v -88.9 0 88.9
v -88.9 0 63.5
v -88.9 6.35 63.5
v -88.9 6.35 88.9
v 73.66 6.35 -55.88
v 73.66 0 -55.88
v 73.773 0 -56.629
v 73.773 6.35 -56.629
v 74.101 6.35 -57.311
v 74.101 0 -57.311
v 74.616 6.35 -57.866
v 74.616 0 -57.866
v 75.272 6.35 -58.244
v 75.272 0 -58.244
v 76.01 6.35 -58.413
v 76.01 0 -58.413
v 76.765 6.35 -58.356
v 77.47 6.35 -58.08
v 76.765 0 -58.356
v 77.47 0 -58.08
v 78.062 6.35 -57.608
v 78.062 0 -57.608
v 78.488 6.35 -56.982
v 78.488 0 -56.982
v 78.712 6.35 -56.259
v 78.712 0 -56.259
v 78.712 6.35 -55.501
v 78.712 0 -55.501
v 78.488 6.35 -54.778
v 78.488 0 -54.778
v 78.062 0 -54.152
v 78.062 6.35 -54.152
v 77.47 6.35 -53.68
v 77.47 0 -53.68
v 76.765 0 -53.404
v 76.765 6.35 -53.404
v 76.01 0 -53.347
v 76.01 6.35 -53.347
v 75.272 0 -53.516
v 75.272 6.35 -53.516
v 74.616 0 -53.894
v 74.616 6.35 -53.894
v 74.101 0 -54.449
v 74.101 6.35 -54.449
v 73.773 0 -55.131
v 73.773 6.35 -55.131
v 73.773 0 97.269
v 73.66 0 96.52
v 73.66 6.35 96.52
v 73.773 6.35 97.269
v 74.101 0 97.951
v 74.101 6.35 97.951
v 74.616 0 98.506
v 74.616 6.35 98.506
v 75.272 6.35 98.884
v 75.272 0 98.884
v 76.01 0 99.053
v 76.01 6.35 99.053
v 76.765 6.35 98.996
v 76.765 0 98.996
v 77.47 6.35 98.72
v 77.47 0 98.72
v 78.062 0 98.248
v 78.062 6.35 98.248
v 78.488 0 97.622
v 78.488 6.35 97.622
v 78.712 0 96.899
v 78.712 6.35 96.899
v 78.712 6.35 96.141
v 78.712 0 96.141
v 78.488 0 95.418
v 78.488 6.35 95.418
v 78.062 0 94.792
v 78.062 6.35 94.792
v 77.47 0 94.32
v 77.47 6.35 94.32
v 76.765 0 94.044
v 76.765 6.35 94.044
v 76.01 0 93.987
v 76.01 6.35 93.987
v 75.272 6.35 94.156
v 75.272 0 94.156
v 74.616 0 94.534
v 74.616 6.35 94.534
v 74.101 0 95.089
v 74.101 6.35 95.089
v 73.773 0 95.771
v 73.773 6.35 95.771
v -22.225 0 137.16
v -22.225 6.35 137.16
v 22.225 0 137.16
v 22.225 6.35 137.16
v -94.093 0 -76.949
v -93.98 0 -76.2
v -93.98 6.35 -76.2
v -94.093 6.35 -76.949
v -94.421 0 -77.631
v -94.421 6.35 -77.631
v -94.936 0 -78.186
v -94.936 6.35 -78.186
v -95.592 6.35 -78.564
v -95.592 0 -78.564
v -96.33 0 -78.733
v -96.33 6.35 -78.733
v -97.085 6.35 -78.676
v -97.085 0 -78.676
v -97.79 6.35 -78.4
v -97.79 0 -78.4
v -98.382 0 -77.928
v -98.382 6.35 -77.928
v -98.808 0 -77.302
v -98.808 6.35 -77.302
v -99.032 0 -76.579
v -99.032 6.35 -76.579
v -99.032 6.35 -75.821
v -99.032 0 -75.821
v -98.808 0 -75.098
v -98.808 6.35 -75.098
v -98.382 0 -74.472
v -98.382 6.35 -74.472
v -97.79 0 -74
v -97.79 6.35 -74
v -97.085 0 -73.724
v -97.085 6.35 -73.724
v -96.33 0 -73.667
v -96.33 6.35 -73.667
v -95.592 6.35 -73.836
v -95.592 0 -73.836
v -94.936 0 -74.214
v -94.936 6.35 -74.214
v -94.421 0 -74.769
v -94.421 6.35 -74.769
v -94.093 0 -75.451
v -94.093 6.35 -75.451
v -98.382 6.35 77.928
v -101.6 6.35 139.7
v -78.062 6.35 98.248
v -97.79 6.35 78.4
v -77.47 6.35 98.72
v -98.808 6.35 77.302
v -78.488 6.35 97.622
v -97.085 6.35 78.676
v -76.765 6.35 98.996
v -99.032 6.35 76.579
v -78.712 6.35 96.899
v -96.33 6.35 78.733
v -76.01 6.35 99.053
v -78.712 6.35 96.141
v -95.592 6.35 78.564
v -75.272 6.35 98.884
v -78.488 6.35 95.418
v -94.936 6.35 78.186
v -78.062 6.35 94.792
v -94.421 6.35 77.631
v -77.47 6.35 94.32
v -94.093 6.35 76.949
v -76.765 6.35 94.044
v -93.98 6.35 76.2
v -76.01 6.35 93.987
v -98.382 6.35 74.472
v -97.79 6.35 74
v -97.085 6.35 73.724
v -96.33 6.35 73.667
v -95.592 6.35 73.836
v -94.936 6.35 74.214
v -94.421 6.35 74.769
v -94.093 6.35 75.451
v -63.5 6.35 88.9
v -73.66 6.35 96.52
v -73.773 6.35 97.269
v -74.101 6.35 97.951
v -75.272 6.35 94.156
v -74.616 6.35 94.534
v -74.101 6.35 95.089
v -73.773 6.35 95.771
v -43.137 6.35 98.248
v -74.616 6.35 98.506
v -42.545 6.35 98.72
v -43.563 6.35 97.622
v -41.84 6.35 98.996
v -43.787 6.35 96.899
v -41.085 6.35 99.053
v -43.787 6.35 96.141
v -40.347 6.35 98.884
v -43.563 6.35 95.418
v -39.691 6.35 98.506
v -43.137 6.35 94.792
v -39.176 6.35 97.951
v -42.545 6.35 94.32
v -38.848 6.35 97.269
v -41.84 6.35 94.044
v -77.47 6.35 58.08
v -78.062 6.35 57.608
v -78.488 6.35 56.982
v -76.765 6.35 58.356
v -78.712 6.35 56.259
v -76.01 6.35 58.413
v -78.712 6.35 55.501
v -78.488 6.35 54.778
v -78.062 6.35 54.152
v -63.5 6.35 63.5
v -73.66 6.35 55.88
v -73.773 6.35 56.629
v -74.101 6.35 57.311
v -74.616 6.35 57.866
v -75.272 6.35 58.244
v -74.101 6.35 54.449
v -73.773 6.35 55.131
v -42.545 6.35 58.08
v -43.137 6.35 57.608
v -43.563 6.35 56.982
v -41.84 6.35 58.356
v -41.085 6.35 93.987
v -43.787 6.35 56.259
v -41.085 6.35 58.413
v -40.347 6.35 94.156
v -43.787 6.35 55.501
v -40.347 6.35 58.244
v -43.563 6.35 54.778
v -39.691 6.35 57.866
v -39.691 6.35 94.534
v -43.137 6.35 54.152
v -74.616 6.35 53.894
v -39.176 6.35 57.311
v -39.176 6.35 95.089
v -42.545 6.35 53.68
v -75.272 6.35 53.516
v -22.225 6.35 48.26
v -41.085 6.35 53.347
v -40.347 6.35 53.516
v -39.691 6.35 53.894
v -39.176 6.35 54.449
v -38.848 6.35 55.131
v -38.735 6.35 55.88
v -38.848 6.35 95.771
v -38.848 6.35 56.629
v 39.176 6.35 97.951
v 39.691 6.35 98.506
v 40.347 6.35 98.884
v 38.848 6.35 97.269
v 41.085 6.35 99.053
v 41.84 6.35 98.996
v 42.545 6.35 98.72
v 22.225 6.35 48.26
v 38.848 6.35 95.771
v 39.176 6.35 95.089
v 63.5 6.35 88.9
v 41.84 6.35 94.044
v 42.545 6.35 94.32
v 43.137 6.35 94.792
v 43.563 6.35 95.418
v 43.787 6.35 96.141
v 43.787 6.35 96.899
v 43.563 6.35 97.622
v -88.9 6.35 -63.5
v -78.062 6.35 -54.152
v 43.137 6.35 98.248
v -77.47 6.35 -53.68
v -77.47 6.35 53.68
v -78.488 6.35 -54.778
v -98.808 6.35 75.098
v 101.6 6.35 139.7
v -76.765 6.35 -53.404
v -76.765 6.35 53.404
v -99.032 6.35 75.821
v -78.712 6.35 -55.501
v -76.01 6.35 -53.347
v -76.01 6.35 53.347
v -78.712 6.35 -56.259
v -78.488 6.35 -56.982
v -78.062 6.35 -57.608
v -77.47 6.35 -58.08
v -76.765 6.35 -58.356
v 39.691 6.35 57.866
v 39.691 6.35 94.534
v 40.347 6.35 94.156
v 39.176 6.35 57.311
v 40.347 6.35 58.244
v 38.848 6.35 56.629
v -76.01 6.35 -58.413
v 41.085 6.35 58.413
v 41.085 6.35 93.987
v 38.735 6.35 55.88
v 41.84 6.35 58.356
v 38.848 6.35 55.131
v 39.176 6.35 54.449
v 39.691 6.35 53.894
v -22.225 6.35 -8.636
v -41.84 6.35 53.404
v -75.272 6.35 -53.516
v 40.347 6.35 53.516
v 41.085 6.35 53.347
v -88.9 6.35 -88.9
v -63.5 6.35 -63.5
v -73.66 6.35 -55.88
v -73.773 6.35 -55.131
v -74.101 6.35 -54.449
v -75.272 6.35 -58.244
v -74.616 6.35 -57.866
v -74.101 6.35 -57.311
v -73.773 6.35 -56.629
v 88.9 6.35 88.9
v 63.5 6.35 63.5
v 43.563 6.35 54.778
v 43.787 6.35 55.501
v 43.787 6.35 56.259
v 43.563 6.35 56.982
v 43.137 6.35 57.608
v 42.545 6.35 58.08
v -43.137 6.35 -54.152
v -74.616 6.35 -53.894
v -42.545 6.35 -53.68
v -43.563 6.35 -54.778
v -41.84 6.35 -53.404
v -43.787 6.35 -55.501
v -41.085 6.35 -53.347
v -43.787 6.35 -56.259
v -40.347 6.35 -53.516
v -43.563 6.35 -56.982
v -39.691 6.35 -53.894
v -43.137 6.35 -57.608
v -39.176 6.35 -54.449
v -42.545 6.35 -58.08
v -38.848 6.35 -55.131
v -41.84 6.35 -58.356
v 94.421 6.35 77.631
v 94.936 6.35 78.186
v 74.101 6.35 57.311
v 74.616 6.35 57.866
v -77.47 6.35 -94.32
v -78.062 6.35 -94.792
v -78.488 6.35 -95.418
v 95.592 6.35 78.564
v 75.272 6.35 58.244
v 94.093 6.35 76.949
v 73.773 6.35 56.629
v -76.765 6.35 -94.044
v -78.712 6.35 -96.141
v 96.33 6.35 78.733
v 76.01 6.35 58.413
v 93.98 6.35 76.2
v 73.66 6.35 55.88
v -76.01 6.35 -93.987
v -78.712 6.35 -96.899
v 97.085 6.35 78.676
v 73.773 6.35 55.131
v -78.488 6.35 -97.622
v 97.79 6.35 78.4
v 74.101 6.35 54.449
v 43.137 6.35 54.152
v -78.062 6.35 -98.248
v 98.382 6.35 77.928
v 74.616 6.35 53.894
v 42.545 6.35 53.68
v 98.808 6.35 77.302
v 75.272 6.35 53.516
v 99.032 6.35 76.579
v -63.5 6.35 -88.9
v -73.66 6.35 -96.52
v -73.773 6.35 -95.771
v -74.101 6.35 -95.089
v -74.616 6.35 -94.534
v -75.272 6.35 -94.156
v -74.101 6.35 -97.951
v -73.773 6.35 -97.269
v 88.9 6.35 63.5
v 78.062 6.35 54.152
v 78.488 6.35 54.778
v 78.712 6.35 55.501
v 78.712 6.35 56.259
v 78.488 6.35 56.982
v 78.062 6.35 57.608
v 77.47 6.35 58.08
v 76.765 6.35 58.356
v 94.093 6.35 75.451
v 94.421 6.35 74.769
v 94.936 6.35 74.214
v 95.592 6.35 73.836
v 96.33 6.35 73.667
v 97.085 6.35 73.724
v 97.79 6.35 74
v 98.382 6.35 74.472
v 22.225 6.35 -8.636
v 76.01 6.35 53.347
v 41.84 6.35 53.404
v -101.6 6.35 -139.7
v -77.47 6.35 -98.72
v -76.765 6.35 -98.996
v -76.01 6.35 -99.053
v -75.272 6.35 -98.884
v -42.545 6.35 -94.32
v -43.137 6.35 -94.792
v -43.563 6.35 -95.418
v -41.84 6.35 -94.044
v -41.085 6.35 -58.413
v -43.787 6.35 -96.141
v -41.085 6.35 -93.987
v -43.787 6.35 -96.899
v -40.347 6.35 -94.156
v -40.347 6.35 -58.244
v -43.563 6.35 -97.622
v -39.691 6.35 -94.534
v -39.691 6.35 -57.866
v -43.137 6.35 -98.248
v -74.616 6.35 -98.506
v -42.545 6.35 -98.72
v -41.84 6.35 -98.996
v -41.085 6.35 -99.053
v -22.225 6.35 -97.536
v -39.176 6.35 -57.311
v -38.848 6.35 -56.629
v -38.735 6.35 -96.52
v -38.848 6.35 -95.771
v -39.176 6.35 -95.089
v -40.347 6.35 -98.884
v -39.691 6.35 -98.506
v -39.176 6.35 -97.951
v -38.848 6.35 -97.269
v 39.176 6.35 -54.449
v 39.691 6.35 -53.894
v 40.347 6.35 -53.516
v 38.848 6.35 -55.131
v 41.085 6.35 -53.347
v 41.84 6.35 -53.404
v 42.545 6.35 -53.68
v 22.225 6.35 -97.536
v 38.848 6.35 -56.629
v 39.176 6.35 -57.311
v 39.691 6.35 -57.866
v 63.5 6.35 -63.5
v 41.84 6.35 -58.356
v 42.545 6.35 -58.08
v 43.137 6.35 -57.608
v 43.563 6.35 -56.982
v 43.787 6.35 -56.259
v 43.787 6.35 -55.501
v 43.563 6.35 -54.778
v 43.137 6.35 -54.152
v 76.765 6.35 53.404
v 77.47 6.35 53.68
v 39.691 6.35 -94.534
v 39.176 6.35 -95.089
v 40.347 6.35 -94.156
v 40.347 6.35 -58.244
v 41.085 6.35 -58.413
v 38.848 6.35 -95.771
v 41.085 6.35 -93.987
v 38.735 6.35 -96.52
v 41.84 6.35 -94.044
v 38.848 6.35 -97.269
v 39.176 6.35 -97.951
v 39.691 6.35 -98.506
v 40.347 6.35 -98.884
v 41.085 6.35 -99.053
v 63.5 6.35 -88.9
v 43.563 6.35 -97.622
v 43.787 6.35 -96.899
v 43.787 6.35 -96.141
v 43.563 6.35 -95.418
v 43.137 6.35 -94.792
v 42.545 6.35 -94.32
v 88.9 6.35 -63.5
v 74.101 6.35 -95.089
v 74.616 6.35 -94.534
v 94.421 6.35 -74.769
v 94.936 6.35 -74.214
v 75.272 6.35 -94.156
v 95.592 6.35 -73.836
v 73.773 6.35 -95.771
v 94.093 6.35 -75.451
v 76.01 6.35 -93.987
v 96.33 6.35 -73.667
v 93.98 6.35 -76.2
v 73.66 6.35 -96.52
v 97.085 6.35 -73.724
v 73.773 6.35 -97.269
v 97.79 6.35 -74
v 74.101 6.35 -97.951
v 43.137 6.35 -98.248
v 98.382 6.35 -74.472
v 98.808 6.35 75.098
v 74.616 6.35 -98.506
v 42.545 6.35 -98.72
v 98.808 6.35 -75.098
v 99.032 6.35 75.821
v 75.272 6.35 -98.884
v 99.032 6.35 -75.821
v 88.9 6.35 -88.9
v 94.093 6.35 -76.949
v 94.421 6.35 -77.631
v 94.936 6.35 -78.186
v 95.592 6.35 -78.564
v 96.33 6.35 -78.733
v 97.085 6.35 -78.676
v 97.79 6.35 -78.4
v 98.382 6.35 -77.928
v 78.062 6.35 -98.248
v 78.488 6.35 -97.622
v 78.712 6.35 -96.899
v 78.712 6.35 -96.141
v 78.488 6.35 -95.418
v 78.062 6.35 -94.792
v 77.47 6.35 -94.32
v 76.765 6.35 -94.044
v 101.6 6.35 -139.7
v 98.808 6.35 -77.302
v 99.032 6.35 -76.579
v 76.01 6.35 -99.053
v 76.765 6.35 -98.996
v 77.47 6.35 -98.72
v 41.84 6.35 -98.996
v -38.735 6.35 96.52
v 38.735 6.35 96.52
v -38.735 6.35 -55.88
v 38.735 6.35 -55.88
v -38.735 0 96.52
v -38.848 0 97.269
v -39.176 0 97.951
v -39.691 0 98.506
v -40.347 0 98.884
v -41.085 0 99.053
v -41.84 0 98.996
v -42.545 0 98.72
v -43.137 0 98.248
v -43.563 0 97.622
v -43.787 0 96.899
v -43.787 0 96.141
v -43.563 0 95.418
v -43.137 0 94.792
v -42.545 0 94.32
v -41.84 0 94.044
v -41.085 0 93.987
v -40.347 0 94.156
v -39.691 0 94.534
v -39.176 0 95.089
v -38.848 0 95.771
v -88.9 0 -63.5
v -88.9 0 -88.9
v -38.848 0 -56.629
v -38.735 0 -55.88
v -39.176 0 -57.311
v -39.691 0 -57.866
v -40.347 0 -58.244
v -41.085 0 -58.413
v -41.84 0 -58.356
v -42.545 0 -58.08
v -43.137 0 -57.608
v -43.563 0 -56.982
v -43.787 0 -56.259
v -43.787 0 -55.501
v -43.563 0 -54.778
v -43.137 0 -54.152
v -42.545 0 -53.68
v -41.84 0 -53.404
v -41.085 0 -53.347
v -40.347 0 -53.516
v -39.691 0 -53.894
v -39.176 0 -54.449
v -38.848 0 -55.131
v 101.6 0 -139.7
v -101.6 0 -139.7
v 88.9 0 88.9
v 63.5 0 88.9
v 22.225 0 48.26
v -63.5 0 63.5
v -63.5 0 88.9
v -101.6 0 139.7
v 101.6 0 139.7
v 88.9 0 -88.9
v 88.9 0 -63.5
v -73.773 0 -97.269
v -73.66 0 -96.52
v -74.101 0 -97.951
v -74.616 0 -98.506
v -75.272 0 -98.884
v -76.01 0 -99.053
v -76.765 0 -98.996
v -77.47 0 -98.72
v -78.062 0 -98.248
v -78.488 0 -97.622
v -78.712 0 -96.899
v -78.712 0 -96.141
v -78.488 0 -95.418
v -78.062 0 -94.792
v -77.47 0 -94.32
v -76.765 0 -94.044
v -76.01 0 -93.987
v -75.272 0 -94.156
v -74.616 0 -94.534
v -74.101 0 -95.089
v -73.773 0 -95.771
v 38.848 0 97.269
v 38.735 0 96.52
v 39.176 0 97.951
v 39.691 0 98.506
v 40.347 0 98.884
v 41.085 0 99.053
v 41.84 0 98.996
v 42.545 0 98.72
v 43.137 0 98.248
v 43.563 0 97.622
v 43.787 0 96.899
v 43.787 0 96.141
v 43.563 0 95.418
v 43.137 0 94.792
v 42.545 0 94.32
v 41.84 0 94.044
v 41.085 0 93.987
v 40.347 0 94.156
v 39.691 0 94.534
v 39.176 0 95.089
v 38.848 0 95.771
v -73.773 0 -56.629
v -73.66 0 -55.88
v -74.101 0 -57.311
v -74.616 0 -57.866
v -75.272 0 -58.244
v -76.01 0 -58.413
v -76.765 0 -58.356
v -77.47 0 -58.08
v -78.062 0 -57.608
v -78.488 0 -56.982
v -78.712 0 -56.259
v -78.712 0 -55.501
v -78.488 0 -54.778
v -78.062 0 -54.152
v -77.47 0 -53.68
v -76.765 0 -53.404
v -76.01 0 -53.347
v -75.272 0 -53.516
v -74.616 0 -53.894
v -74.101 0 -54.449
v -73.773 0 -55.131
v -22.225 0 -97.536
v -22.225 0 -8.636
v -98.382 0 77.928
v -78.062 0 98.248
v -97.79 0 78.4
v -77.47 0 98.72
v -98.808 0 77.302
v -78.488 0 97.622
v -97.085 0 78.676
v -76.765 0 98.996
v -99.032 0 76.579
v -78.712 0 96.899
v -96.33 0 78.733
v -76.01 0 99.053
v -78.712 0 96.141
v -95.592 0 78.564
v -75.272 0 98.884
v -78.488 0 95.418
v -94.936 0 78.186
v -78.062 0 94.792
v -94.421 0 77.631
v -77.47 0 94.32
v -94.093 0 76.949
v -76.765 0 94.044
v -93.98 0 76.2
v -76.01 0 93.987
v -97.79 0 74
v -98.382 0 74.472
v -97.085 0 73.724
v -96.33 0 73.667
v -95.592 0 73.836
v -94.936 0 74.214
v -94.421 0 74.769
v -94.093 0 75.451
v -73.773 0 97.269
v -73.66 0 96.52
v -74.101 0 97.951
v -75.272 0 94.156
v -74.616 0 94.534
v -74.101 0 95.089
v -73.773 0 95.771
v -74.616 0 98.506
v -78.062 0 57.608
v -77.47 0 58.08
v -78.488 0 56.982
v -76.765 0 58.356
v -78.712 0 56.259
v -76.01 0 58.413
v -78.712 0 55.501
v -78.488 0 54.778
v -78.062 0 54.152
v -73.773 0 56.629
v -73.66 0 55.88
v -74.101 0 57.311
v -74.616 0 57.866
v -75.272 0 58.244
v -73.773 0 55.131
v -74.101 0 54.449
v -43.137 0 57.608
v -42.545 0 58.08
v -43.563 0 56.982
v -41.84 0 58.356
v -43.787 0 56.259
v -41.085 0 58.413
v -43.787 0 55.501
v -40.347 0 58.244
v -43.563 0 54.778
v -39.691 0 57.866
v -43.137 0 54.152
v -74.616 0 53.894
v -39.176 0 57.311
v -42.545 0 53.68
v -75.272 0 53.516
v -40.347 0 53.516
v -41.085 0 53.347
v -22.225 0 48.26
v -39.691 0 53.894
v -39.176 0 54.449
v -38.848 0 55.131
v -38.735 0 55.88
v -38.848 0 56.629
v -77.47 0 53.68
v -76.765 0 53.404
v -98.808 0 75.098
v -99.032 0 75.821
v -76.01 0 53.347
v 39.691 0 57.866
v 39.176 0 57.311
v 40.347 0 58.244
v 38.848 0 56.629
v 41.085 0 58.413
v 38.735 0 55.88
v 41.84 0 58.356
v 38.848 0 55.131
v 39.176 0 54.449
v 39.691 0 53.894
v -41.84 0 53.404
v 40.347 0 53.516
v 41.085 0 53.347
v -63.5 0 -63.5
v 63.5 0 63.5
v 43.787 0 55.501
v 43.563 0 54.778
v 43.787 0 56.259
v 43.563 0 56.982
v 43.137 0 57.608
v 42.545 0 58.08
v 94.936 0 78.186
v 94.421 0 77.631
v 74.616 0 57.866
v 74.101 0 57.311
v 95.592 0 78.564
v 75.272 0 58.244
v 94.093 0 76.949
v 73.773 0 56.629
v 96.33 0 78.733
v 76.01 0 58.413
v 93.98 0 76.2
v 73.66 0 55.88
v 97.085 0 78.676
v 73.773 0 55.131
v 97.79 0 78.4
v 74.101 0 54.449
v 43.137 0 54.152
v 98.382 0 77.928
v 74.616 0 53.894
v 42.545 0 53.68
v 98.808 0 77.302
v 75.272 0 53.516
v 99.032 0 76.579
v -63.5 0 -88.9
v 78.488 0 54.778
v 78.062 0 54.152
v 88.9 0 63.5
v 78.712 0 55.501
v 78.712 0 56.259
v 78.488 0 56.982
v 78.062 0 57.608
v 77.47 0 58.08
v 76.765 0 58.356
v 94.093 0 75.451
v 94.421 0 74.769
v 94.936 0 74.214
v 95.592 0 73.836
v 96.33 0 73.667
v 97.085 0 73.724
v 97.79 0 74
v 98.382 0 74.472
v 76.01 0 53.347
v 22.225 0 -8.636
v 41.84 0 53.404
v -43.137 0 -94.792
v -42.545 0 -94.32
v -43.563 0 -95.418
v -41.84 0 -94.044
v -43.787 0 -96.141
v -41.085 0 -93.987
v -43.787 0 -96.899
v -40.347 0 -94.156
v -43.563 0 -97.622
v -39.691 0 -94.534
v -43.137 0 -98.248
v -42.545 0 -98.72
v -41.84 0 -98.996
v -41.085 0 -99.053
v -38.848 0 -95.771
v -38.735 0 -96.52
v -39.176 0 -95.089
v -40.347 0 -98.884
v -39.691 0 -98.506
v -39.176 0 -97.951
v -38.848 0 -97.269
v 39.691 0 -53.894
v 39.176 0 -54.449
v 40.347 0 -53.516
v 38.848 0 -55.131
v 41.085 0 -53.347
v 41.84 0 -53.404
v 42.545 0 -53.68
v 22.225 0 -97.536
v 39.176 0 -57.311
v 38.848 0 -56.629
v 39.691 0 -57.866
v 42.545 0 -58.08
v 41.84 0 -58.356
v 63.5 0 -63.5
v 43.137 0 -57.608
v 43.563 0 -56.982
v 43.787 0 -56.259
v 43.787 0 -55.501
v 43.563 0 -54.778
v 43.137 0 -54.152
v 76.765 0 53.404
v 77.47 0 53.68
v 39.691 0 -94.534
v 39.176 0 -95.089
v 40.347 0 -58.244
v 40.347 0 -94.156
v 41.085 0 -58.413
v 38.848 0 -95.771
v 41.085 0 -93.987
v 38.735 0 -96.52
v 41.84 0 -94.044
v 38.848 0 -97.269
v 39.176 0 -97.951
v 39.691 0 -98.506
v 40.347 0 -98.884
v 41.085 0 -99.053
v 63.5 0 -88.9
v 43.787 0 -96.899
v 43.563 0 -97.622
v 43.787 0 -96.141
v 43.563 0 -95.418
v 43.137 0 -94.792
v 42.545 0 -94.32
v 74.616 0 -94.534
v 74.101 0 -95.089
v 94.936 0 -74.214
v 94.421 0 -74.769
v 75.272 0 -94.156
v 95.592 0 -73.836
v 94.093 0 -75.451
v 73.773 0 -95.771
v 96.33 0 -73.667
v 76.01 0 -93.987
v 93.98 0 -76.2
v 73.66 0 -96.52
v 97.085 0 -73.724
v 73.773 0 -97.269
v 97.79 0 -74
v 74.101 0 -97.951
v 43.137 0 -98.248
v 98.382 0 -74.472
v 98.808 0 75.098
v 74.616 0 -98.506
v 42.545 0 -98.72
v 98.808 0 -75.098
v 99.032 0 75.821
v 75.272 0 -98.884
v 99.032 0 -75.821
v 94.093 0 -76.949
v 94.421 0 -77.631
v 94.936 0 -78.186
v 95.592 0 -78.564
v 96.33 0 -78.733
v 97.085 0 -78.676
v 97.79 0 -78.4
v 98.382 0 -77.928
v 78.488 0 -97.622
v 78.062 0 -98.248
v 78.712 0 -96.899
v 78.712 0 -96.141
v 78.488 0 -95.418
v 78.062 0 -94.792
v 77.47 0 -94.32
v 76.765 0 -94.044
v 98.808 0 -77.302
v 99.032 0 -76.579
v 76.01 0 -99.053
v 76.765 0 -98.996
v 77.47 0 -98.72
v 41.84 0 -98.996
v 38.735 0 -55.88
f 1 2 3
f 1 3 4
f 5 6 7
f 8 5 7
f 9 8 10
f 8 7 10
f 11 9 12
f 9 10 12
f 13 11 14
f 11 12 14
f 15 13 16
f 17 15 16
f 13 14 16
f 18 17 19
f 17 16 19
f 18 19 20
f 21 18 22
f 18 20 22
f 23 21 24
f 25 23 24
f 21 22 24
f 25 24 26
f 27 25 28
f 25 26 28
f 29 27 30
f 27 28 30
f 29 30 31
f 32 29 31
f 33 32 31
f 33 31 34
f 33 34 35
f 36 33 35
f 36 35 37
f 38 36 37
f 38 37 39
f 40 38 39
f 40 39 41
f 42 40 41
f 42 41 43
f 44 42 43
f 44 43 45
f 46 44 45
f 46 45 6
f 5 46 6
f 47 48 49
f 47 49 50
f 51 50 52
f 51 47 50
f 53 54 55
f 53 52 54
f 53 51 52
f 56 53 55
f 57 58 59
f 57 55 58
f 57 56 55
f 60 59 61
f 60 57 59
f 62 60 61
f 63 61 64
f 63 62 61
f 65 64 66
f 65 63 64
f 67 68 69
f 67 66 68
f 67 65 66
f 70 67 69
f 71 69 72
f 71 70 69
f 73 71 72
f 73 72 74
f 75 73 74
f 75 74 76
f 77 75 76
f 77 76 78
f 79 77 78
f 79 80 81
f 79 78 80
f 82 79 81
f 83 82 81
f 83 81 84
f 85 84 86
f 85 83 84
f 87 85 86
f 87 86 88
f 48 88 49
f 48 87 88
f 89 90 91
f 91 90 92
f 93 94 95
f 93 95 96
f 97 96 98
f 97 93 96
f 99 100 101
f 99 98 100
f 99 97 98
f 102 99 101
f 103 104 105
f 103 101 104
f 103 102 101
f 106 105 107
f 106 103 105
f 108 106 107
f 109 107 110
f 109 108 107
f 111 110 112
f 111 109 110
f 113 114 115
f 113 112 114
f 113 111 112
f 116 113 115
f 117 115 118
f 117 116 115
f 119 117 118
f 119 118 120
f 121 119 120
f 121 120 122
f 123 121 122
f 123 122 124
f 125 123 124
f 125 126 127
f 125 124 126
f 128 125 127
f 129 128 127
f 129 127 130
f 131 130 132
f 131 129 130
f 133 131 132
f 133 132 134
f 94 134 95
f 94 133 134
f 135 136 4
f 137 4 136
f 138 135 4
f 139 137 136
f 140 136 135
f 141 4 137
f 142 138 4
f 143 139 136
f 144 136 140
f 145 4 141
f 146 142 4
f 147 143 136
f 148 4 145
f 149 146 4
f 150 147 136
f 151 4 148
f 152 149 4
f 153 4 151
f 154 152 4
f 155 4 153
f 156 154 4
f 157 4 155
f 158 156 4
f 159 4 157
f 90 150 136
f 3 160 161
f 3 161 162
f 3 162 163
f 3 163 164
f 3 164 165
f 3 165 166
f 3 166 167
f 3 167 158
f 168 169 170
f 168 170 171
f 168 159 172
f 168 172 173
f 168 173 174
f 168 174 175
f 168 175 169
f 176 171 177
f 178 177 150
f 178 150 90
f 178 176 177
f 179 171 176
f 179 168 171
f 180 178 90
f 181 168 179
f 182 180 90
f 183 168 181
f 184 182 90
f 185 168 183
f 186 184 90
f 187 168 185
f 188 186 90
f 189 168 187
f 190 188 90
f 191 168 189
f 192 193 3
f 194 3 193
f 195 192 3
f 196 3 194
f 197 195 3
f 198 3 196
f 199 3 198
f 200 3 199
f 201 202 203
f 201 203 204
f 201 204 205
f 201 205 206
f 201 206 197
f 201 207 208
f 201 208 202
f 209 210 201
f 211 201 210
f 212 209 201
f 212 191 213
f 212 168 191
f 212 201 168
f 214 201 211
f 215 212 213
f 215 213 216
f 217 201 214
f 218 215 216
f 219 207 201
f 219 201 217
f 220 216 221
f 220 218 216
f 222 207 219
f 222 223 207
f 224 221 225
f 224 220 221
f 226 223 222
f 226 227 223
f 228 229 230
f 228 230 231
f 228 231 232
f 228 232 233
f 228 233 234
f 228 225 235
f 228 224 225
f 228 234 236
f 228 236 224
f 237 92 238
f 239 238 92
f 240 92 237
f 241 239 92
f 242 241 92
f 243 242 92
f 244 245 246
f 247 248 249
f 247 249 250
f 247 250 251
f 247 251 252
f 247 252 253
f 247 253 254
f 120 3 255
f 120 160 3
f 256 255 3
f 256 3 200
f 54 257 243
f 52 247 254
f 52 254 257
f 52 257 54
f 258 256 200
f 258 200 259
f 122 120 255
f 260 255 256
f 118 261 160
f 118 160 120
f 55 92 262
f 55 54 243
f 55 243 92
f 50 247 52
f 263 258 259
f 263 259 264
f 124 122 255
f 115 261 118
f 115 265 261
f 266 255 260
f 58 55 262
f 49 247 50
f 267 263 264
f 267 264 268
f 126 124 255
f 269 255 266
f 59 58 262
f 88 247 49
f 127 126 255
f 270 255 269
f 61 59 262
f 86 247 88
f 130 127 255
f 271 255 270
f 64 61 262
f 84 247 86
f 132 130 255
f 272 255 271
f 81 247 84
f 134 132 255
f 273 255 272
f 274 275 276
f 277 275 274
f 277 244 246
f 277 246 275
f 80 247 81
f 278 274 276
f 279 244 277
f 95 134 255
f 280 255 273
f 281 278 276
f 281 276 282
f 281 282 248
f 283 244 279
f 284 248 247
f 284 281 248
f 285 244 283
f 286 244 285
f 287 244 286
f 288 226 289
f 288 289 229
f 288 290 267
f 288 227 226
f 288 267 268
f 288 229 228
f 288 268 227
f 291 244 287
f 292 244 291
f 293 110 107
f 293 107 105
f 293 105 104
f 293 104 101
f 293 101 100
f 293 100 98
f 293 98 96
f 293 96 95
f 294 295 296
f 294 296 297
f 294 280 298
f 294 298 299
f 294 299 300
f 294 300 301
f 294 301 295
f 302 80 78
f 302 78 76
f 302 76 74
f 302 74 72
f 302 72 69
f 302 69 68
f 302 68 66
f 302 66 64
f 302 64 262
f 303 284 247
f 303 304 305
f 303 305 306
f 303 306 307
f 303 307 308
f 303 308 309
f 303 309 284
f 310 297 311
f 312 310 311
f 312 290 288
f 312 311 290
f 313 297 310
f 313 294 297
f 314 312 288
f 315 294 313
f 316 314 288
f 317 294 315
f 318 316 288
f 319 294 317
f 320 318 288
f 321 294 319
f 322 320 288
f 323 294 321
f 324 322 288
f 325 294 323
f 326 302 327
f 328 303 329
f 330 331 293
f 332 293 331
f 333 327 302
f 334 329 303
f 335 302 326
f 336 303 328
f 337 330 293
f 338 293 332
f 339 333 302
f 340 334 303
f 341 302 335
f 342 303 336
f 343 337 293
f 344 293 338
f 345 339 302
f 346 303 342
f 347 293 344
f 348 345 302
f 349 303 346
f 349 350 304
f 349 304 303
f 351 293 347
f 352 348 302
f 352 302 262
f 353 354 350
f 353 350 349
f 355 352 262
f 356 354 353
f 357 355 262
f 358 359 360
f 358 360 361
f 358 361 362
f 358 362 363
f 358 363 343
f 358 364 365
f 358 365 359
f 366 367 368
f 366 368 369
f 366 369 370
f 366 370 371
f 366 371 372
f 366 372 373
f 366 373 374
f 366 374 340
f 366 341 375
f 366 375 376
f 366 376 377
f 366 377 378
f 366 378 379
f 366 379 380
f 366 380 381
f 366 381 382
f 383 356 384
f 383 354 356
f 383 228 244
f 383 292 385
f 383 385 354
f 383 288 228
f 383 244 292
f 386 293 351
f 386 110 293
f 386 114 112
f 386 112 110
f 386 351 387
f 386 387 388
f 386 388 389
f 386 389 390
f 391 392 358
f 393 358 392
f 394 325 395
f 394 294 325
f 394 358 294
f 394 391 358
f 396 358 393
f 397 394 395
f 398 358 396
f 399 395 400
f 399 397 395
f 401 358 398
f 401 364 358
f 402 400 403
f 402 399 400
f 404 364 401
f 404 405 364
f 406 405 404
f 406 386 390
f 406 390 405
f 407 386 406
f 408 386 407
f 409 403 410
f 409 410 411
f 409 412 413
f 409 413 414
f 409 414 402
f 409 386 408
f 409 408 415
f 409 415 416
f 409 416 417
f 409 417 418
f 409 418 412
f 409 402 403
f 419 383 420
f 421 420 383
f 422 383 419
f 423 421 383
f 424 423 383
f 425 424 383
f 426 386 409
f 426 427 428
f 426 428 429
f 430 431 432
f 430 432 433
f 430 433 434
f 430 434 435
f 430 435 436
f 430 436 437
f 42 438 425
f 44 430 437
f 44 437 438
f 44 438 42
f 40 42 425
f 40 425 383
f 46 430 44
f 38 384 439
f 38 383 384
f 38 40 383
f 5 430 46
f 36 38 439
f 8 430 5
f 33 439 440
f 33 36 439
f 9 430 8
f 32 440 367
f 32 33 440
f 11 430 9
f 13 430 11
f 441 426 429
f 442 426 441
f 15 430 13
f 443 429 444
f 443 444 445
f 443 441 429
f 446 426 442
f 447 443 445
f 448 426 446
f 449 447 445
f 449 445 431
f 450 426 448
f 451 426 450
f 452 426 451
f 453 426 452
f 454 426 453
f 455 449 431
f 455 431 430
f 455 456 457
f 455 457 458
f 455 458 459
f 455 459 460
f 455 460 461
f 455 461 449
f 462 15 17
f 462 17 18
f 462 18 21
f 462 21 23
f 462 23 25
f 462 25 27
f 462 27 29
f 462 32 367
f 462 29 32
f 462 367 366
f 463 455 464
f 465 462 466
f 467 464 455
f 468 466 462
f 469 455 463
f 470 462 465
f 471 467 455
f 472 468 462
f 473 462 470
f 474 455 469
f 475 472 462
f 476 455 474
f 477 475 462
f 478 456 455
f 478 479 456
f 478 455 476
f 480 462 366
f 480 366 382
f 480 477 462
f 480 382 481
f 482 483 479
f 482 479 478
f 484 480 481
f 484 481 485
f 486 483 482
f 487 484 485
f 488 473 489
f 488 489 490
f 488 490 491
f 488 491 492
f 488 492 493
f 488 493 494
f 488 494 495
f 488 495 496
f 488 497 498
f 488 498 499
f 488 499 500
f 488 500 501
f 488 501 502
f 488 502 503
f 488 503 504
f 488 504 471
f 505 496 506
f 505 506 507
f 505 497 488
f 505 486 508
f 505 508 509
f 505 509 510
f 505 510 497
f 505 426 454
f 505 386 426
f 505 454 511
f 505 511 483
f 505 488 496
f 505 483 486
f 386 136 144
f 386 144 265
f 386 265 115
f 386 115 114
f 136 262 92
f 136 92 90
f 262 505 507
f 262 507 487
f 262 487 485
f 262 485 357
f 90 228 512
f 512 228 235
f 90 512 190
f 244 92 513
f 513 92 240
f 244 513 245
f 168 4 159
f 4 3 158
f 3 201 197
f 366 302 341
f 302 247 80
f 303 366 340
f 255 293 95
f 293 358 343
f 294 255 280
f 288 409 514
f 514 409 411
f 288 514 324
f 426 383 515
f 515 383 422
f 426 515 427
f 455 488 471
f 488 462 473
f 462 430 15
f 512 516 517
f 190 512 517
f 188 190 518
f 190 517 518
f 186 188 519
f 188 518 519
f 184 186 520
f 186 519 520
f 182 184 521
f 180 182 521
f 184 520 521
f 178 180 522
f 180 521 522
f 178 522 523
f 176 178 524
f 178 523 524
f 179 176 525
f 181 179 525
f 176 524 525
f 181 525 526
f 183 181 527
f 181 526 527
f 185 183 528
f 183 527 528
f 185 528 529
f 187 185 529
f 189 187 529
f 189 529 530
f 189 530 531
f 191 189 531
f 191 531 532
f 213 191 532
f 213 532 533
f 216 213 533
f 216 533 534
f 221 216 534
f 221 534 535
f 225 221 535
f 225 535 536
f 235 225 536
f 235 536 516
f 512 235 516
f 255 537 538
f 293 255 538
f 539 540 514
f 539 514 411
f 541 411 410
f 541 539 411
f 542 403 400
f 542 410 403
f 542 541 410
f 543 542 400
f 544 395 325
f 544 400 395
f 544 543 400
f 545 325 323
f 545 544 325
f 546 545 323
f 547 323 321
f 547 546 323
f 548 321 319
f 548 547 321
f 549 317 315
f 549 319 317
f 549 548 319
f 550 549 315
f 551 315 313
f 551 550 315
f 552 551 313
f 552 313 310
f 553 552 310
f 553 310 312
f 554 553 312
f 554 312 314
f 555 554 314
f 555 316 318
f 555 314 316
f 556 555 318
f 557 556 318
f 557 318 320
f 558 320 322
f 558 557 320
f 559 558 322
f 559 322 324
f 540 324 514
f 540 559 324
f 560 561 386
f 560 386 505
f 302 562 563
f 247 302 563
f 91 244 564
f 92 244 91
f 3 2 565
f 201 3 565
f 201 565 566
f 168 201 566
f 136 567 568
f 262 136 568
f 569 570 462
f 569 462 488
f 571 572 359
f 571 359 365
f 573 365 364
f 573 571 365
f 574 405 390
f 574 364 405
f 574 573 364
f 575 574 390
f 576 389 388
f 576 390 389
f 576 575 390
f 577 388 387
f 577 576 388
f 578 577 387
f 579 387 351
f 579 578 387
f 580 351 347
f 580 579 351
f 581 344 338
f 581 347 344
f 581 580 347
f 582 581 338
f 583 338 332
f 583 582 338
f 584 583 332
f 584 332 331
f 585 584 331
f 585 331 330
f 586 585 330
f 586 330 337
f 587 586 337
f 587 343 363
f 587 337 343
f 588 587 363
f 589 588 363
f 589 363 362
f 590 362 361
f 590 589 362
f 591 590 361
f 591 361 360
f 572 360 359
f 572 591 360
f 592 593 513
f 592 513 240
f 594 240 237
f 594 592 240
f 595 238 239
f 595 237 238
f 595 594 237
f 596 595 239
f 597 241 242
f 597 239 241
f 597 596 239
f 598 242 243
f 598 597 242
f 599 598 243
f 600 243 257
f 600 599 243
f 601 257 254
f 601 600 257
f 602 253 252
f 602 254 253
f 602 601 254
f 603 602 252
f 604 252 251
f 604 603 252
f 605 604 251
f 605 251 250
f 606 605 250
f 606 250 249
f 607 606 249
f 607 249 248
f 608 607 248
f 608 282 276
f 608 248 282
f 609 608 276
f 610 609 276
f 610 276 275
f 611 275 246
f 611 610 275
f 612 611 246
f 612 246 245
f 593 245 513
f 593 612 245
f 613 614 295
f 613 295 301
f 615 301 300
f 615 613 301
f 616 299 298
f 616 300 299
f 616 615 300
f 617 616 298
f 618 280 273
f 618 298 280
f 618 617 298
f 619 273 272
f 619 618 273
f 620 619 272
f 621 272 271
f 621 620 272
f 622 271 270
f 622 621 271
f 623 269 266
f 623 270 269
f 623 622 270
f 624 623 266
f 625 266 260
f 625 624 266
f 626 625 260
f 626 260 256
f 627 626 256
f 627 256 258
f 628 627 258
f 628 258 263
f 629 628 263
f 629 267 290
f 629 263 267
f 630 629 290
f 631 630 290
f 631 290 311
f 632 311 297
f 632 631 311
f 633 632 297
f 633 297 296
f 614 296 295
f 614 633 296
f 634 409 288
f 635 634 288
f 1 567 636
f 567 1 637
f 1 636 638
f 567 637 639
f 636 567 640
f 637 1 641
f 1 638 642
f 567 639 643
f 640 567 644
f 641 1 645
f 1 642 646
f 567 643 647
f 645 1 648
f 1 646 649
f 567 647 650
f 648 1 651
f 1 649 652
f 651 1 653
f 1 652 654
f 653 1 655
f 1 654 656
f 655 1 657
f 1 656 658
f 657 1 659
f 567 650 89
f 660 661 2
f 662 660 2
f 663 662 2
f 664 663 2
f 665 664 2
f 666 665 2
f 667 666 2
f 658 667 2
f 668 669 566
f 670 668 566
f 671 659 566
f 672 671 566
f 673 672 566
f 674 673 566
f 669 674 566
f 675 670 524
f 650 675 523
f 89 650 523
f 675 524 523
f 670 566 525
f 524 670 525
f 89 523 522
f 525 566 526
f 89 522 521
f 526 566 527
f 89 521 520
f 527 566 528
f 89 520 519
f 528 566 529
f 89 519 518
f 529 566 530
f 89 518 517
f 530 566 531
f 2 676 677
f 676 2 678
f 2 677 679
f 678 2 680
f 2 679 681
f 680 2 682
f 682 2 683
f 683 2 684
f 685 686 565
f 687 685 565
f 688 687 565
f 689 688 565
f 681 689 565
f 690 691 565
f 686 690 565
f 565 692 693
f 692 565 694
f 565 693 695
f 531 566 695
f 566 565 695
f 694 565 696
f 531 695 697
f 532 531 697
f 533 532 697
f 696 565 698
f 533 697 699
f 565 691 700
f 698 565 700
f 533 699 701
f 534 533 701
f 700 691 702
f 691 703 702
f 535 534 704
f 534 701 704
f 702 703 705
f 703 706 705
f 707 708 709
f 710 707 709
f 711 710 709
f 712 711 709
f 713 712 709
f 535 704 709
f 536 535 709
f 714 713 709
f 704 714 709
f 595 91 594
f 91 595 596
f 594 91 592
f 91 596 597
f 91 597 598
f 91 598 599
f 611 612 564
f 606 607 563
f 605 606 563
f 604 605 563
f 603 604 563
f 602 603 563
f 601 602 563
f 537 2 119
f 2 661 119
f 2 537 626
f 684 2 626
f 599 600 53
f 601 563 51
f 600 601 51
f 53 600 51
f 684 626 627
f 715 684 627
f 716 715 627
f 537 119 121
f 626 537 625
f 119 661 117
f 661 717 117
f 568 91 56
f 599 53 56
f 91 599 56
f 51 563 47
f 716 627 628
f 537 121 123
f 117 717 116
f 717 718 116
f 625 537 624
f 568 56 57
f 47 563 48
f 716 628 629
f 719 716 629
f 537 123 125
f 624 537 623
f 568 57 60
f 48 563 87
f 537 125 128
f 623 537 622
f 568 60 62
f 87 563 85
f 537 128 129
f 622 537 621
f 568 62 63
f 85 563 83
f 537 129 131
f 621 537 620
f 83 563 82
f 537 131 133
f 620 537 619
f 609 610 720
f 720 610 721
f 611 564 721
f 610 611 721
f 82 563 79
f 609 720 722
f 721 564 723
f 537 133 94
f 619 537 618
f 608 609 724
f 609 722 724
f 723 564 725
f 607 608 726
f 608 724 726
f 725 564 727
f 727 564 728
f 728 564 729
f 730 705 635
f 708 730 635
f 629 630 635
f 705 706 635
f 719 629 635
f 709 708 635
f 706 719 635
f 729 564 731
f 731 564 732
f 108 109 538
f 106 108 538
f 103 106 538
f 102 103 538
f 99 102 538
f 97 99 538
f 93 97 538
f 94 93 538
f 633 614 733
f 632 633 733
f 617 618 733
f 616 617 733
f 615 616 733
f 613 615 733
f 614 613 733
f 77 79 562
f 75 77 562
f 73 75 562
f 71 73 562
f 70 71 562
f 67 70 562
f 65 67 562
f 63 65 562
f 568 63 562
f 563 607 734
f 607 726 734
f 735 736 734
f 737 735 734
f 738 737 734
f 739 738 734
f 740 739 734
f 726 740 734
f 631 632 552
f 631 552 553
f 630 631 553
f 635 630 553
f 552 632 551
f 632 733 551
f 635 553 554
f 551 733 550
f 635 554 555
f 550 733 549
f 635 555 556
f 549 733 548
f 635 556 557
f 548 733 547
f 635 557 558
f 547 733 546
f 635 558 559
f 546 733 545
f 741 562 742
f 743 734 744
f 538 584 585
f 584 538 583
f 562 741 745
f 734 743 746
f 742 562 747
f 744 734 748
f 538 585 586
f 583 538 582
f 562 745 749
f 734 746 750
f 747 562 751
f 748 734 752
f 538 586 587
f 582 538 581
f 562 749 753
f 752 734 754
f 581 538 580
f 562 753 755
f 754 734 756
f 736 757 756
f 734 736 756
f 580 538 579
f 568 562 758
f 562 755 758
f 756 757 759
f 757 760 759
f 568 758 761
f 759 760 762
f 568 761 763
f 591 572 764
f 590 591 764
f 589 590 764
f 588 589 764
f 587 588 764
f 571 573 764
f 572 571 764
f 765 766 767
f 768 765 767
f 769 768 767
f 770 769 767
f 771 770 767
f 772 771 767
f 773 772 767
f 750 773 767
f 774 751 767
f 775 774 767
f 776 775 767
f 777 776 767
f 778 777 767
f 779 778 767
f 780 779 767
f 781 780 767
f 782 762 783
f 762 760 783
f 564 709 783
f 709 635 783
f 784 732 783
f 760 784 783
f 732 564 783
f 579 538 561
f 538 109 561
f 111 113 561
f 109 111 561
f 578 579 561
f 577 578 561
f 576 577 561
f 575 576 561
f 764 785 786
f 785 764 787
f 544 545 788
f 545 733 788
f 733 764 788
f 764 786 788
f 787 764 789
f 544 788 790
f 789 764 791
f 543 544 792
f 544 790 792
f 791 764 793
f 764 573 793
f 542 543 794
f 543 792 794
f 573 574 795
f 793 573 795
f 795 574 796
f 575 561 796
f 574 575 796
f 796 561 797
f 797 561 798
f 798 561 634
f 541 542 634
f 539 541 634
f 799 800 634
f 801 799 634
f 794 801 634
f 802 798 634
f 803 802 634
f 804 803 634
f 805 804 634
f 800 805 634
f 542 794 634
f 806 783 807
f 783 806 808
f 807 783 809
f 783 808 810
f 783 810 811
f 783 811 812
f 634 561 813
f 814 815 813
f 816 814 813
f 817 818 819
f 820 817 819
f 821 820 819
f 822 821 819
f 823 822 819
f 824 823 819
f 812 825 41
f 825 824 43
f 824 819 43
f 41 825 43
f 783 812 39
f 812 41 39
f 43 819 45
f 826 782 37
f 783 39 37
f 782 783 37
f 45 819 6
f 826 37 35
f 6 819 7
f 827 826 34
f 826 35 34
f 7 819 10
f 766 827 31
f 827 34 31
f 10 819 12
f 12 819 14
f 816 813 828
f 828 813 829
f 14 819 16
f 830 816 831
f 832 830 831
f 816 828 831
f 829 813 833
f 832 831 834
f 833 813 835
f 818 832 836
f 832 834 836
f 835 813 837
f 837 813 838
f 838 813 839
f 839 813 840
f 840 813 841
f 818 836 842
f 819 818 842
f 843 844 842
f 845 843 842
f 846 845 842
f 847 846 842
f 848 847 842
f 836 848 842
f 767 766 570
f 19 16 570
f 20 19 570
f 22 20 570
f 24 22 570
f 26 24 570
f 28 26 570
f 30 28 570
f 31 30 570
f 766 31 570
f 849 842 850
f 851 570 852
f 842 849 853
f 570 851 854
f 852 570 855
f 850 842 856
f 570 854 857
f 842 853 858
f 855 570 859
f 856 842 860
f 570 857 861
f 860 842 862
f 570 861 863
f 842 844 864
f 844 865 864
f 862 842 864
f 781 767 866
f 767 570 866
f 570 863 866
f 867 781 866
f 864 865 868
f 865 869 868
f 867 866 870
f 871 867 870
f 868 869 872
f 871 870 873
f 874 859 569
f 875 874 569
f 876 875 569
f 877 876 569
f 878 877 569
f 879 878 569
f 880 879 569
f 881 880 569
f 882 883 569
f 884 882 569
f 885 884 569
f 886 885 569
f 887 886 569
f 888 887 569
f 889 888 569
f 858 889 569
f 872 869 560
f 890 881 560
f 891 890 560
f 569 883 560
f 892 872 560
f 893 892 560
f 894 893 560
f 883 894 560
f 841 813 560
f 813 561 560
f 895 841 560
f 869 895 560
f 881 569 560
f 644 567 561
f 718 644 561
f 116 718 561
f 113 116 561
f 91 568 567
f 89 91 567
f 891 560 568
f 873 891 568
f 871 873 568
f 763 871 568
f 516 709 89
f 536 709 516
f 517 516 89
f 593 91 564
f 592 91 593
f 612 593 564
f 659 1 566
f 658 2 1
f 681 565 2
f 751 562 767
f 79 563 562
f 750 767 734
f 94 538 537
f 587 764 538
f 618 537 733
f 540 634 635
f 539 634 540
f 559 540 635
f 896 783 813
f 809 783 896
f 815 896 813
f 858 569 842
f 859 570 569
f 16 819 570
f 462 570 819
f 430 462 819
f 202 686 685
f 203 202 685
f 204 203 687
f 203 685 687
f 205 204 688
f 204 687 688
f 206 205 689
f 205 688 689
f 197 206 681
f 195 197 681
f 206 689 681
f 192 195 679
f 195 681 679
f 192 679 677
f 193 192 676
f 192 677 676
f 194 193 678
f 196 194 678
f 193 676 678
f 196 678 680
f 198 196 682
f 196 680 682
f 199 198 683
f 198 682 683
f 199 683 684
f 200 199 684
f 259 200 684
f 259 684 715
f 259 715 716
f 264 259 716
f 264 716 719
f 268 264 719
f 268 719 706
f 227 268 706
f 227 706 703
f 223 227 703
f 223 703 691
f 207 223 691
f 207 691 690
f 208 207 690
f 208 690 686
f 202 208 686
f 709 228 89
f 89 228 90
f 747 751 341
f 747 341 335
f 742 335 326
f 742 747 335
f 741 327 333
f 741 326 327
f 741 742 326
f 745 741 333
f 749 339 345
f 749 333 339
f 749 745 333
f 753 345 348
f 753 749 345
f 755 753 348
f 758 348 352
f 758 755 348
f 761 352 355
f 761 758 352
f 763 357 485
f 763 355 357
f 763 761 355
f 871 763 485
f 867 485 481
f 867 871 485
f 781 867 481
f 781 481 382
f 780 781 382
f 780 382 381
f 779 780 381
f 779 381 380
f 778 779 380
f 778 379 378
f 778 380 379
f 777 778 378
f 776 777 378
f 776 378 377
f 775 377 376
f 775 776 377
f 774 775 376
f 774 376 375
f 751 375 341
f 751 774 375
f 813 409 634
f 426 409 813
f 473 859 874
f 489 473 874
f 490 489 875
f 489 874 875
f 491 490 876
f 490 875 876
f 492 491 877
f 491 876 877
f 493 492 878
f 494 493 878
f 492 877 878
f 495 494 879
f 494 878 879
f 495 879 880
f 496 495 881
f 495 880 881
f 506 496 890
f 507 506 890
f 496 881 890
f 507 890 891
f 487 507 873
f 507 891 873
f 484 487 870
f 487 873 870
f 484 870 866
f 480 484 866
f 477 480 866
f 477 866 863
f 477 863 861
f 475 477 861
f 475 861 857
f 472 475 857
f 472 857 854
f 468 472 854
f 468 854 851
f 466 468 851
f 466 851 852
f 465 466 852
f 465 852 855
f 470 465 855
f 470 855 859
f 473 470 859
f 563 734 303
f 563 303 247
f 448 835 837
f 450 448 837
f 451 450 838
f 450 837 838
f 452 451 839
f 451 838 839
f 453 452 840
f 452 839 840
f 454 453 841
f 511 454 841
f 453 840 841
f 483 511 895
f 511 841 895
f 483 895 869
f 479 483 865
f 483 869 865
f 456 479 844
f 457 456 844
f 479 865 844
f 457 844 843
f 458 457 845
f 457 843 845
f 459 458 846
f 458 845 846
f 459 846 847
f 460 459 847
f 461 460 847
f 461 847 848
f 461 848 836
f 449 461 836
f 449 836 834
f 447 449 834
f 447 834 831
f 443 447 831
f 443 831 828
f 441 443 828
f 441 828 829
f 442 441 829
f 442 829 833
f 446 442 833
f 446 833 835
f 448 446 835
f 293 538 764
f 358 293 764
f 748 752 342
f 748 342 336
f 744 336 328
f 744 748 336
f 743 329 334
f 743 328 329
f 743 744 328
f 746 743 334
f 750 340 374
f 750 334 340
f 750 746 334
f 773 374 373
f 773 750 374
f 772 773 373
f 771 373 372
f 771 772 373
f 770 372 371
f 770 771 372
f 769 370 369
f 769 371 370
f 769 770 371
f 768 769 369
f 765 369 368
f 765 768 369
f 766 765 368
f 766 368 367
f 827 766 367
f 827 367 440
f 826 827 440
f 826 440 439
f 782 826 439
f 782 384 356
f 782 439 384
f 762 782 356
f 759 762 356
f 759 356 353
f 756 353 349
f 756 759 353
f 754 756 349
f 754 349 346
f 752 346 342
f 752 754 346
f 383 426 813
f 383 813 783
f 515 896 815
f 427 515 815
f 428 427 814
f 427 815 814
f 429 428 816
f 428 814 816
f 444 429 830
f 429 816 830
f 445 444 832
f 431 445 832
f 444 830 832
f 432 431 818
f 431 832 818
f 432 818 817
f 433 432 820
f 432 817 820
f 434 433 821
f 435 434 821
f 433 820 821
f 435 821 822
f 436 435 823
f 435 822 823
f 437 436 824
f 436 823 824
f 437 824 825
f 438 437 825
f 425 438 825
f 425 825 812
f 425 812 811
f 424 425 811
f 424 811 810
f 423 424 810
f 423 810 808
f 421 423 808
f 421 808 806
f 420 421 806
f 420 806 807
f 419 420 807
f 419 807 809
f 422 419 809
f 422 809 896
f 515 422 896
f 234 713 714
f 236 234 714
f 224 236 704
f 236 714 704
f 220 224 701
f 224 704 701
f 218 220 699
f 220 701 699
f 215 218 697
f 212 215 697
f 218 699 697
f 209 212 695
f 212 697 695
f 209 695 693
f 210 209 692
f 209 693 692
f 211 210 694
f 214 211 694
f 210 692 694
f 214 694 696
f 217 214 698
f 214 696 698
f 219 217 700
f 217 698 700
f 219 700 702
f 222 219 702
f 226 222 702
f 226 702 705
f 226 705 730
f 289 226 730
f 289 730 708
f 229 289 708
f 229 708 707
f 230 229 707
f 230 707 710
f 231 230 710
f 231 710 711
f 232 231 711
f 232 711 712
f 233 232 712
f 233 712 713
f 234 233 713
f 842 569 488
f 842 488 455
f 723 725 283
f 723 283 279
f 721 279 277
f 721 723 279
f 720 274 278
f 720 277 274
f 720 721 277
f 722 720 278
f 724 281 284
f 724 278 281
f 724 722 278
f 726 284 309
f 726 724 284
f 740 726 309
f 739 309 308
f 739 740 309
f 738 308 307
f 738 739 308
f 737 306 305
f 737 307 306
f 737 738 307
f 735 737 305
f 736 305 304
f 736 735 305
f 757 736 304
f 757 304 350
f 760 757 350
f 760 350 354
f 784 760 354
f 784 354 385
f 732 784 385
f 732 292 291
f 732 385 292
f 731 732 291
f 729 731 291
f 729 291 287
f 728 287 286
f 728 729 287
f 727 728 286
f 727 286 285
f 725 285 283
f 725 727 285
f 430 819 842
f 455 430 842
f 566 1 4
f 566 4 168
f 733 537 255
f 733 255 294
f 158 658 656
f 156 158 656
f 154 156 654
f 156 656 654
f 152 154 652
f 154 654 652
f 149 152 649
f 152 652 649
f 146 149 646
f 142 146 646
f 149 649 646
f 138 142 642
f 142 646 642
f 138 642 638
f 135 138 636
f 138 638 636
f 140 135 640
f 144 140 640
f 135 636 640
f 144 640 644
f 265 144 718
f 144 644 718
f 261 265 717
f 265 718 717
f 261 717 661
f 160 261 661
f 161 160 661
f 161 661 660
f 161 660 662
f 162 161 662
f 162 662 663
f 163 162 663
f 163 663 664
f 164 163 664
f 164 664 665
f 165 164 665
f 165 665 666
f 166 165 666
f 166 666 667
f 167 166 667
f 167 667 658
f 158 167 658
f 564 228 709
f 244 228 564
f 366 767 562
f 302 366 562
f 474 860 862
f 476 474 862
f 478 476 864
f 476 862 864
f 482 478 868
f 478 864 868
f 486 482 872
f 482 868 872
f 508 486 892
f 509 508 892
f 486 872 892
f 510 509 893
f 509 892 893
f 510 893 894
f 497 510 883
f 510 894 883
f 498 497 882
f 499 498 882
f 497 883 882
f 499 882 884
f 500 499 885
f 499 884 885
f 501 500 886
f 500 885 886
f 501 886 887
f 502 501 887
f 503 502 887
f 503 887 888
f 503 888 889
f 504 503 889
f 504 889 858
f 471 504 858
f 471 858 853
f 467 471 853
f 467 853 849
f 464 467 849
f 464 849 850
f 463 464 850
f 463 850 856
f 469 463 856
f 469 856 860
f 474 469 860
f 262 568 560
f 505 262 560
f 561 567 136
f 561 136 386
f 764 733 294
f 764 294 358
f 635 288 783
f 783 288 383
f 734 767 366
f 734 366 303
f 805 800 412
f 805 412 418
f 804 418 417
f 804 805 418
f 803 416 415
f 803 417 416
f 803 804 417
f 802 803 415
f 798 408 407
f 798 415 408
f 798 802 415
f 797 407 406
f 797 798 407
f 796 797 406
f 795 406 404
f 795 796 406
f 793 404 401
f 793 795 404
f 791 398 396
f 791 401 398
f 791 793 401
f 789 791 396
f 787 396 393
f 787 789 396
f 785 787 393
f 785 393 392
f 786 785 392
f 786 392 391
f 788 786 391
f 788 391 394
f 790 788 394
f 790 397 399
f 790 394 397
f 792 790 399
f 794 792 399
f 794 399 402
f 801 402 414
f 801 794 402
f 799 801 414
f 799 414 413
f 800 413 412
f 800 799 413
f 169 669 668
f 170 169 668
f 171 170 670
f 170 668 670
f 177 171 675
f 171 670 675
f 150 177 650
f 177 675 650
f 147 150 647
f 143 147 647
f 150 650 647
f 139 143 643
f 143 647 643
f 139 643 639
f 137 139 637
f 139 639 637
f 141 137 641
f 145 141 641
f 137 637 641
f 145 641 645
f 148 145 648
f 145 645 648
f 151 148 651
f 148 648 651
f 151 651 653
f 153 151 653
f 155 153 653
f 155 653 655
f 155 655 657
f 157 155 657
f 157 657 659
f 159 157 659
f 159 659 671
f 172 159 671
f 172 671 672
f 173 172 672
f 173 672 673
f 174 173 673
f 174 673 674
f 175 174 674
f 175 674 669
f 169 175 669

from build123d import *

# Parameters (mm, degrees)
SKETCH1_W               = 203.2
SKETCH1_H               = 279.4
BOSS_EXTRUDE1_DEPTH     = 6.35
CUT_EXTRUDE1_START      = -7.35
SKETCH2_R               = 2.54
SKETCH2_W               = 25.4
SKETCH2_H               = 25.4
CUT_EXTRUDE1_DEPTH      = 8.35
MIRROR2_START           = -7.35
MIRROR2_COPY_1_SKETCH_R = 2.54
MIRROR2_COPY_1_SKETCH_W = 25.4
MIRROR2_COPY_1_SKETCH_H = 25.4
MIRROR2_COPY_1_DEPTH    = 8.35
SKETCH3_W               = 88.9
SKETCH3_H               = 44.45
CUT_EXTRUDE2_DEPTH      = 1
CUT_EXTRUDE2_DEPTH_BACK = 7.35


with BuildPart() as part:
    # Sketch1 → Boss-Extrude1 (new body)
    with BuildSketch(Plane(origin=(0, 0, 0), x_dir=(1, 0, 0), z_dir=(0, 1, 0))):
        Rectangle(SKETCH1_W, SKETCH1_H)
    extrude(amount=BOSS_EXTRUDE1_DEPTH)

    # Sketch2 → Cut-Extrude1 (cut)
    with BuildSketch(Plane(origin=(0, 6.35, 0), x_dir=(1, 0, 0), z_dir=(0, 1, 0)).offset(CUT_EXTRUDE1_START)):
        with Locations((-41.275, 55.88)):
            Circle(SKETCH2_R)
        with Locations((-41.275, 96.52)):
            Circle(SKETCH2_R)
        with Locations((-76.2, 55.88)):
            Circle(SKETCH2_R)
        with Locations((-96.52, 76.2)):
            Circle(SKETCH2_R)
        with Locations((-76.2, 96.52)):
            Circle(SKETCH2_R)
        with Locations((-76.2, 76.2)):
            Rectangle(SKETCH2_W, SKETCH2_H)
    cut_extrude1 = extrude(amount=CUT_EXTRUDE1_DEPTH, mode=Mode.SUBTRACT)

    # Mirror1: Cut-Extrude1 across plane
    add(cut_extrude1.mirror(Plane.XY), mode=Mode.SUBTRACT)

    # Mirror2: Cut-Extrude1 across plane
    add(cut_extrude1.mirror(Plane(origin=(0, 0, 0), x_dir=(0, 0, 1), z_dir=(1, 0, 0))), mode=Mode.SUBTRACT)

    # Mirror2 copy 1 sketch → Mirror2 copy 1 (cut)
    with BuildSketch(Plane(origin=(0, 6.35, 0), x_dir=(-1, 0, 0), z_dir=(0, 1, 0)).offset(MIRROR2_START)):
        with Locations((-41.275, 55.88)):
            Circle(MIRROR2_COPY_1_SKETCH_R)
        with Locations((-41.275, 96.52)):
            Circle(MIRROR2_COPY_1_SKETCH_R)
        with Locations((-76.2, 55.88)):
            Circle(MIRROR2_COPY_1_SKETCH_R)
        with Locations((-96.52, 76.2)):
            Circle(MIRROR2_COPY_1_SKETCH_R)
        with Locations((-76.2, 96.52)):
            Circle(MIRROR2_COPY_1_SKETCH_R)
        with Locations((-76.2, 76.2)):
            Rectangle(MIRROR2_COPY_1_SKETCH_W, MIRROR2_COPY_1_SKETCH_H)
    extrude(amount=MIRROR2_COPY_1_DEPTH, mode=Mode.SUBTRACT)

    # Sketch3 → Cut-Extrude2 (cut, two sides)
    with BuildSketch(Plane(origin=(32.763599602, 6.35, -4.611240895), x_dir=(0, 0, 1), z_dir=(0, 1, 0))) as cut_extrude2_sk:
        with Locations((-48.474759105, -32.763599602)):
            Rectangle(SKETCH3_W, SKETCH3_H)
        with Locations((97.321240895, -32.763599602)):
            Rectangle(SKETCH3_W, SKETCH3_H)
    extrude(amount=CUT_EXTRUDE2_DEPTH, mode=Mode.SUBTRACT)
    extrude(cut_extrude2_sk.sketch, amount=-CUT_EXTRUDE2_DEPTH_BACK, mode=Mode.SUBTRACT)


solid = part.part
